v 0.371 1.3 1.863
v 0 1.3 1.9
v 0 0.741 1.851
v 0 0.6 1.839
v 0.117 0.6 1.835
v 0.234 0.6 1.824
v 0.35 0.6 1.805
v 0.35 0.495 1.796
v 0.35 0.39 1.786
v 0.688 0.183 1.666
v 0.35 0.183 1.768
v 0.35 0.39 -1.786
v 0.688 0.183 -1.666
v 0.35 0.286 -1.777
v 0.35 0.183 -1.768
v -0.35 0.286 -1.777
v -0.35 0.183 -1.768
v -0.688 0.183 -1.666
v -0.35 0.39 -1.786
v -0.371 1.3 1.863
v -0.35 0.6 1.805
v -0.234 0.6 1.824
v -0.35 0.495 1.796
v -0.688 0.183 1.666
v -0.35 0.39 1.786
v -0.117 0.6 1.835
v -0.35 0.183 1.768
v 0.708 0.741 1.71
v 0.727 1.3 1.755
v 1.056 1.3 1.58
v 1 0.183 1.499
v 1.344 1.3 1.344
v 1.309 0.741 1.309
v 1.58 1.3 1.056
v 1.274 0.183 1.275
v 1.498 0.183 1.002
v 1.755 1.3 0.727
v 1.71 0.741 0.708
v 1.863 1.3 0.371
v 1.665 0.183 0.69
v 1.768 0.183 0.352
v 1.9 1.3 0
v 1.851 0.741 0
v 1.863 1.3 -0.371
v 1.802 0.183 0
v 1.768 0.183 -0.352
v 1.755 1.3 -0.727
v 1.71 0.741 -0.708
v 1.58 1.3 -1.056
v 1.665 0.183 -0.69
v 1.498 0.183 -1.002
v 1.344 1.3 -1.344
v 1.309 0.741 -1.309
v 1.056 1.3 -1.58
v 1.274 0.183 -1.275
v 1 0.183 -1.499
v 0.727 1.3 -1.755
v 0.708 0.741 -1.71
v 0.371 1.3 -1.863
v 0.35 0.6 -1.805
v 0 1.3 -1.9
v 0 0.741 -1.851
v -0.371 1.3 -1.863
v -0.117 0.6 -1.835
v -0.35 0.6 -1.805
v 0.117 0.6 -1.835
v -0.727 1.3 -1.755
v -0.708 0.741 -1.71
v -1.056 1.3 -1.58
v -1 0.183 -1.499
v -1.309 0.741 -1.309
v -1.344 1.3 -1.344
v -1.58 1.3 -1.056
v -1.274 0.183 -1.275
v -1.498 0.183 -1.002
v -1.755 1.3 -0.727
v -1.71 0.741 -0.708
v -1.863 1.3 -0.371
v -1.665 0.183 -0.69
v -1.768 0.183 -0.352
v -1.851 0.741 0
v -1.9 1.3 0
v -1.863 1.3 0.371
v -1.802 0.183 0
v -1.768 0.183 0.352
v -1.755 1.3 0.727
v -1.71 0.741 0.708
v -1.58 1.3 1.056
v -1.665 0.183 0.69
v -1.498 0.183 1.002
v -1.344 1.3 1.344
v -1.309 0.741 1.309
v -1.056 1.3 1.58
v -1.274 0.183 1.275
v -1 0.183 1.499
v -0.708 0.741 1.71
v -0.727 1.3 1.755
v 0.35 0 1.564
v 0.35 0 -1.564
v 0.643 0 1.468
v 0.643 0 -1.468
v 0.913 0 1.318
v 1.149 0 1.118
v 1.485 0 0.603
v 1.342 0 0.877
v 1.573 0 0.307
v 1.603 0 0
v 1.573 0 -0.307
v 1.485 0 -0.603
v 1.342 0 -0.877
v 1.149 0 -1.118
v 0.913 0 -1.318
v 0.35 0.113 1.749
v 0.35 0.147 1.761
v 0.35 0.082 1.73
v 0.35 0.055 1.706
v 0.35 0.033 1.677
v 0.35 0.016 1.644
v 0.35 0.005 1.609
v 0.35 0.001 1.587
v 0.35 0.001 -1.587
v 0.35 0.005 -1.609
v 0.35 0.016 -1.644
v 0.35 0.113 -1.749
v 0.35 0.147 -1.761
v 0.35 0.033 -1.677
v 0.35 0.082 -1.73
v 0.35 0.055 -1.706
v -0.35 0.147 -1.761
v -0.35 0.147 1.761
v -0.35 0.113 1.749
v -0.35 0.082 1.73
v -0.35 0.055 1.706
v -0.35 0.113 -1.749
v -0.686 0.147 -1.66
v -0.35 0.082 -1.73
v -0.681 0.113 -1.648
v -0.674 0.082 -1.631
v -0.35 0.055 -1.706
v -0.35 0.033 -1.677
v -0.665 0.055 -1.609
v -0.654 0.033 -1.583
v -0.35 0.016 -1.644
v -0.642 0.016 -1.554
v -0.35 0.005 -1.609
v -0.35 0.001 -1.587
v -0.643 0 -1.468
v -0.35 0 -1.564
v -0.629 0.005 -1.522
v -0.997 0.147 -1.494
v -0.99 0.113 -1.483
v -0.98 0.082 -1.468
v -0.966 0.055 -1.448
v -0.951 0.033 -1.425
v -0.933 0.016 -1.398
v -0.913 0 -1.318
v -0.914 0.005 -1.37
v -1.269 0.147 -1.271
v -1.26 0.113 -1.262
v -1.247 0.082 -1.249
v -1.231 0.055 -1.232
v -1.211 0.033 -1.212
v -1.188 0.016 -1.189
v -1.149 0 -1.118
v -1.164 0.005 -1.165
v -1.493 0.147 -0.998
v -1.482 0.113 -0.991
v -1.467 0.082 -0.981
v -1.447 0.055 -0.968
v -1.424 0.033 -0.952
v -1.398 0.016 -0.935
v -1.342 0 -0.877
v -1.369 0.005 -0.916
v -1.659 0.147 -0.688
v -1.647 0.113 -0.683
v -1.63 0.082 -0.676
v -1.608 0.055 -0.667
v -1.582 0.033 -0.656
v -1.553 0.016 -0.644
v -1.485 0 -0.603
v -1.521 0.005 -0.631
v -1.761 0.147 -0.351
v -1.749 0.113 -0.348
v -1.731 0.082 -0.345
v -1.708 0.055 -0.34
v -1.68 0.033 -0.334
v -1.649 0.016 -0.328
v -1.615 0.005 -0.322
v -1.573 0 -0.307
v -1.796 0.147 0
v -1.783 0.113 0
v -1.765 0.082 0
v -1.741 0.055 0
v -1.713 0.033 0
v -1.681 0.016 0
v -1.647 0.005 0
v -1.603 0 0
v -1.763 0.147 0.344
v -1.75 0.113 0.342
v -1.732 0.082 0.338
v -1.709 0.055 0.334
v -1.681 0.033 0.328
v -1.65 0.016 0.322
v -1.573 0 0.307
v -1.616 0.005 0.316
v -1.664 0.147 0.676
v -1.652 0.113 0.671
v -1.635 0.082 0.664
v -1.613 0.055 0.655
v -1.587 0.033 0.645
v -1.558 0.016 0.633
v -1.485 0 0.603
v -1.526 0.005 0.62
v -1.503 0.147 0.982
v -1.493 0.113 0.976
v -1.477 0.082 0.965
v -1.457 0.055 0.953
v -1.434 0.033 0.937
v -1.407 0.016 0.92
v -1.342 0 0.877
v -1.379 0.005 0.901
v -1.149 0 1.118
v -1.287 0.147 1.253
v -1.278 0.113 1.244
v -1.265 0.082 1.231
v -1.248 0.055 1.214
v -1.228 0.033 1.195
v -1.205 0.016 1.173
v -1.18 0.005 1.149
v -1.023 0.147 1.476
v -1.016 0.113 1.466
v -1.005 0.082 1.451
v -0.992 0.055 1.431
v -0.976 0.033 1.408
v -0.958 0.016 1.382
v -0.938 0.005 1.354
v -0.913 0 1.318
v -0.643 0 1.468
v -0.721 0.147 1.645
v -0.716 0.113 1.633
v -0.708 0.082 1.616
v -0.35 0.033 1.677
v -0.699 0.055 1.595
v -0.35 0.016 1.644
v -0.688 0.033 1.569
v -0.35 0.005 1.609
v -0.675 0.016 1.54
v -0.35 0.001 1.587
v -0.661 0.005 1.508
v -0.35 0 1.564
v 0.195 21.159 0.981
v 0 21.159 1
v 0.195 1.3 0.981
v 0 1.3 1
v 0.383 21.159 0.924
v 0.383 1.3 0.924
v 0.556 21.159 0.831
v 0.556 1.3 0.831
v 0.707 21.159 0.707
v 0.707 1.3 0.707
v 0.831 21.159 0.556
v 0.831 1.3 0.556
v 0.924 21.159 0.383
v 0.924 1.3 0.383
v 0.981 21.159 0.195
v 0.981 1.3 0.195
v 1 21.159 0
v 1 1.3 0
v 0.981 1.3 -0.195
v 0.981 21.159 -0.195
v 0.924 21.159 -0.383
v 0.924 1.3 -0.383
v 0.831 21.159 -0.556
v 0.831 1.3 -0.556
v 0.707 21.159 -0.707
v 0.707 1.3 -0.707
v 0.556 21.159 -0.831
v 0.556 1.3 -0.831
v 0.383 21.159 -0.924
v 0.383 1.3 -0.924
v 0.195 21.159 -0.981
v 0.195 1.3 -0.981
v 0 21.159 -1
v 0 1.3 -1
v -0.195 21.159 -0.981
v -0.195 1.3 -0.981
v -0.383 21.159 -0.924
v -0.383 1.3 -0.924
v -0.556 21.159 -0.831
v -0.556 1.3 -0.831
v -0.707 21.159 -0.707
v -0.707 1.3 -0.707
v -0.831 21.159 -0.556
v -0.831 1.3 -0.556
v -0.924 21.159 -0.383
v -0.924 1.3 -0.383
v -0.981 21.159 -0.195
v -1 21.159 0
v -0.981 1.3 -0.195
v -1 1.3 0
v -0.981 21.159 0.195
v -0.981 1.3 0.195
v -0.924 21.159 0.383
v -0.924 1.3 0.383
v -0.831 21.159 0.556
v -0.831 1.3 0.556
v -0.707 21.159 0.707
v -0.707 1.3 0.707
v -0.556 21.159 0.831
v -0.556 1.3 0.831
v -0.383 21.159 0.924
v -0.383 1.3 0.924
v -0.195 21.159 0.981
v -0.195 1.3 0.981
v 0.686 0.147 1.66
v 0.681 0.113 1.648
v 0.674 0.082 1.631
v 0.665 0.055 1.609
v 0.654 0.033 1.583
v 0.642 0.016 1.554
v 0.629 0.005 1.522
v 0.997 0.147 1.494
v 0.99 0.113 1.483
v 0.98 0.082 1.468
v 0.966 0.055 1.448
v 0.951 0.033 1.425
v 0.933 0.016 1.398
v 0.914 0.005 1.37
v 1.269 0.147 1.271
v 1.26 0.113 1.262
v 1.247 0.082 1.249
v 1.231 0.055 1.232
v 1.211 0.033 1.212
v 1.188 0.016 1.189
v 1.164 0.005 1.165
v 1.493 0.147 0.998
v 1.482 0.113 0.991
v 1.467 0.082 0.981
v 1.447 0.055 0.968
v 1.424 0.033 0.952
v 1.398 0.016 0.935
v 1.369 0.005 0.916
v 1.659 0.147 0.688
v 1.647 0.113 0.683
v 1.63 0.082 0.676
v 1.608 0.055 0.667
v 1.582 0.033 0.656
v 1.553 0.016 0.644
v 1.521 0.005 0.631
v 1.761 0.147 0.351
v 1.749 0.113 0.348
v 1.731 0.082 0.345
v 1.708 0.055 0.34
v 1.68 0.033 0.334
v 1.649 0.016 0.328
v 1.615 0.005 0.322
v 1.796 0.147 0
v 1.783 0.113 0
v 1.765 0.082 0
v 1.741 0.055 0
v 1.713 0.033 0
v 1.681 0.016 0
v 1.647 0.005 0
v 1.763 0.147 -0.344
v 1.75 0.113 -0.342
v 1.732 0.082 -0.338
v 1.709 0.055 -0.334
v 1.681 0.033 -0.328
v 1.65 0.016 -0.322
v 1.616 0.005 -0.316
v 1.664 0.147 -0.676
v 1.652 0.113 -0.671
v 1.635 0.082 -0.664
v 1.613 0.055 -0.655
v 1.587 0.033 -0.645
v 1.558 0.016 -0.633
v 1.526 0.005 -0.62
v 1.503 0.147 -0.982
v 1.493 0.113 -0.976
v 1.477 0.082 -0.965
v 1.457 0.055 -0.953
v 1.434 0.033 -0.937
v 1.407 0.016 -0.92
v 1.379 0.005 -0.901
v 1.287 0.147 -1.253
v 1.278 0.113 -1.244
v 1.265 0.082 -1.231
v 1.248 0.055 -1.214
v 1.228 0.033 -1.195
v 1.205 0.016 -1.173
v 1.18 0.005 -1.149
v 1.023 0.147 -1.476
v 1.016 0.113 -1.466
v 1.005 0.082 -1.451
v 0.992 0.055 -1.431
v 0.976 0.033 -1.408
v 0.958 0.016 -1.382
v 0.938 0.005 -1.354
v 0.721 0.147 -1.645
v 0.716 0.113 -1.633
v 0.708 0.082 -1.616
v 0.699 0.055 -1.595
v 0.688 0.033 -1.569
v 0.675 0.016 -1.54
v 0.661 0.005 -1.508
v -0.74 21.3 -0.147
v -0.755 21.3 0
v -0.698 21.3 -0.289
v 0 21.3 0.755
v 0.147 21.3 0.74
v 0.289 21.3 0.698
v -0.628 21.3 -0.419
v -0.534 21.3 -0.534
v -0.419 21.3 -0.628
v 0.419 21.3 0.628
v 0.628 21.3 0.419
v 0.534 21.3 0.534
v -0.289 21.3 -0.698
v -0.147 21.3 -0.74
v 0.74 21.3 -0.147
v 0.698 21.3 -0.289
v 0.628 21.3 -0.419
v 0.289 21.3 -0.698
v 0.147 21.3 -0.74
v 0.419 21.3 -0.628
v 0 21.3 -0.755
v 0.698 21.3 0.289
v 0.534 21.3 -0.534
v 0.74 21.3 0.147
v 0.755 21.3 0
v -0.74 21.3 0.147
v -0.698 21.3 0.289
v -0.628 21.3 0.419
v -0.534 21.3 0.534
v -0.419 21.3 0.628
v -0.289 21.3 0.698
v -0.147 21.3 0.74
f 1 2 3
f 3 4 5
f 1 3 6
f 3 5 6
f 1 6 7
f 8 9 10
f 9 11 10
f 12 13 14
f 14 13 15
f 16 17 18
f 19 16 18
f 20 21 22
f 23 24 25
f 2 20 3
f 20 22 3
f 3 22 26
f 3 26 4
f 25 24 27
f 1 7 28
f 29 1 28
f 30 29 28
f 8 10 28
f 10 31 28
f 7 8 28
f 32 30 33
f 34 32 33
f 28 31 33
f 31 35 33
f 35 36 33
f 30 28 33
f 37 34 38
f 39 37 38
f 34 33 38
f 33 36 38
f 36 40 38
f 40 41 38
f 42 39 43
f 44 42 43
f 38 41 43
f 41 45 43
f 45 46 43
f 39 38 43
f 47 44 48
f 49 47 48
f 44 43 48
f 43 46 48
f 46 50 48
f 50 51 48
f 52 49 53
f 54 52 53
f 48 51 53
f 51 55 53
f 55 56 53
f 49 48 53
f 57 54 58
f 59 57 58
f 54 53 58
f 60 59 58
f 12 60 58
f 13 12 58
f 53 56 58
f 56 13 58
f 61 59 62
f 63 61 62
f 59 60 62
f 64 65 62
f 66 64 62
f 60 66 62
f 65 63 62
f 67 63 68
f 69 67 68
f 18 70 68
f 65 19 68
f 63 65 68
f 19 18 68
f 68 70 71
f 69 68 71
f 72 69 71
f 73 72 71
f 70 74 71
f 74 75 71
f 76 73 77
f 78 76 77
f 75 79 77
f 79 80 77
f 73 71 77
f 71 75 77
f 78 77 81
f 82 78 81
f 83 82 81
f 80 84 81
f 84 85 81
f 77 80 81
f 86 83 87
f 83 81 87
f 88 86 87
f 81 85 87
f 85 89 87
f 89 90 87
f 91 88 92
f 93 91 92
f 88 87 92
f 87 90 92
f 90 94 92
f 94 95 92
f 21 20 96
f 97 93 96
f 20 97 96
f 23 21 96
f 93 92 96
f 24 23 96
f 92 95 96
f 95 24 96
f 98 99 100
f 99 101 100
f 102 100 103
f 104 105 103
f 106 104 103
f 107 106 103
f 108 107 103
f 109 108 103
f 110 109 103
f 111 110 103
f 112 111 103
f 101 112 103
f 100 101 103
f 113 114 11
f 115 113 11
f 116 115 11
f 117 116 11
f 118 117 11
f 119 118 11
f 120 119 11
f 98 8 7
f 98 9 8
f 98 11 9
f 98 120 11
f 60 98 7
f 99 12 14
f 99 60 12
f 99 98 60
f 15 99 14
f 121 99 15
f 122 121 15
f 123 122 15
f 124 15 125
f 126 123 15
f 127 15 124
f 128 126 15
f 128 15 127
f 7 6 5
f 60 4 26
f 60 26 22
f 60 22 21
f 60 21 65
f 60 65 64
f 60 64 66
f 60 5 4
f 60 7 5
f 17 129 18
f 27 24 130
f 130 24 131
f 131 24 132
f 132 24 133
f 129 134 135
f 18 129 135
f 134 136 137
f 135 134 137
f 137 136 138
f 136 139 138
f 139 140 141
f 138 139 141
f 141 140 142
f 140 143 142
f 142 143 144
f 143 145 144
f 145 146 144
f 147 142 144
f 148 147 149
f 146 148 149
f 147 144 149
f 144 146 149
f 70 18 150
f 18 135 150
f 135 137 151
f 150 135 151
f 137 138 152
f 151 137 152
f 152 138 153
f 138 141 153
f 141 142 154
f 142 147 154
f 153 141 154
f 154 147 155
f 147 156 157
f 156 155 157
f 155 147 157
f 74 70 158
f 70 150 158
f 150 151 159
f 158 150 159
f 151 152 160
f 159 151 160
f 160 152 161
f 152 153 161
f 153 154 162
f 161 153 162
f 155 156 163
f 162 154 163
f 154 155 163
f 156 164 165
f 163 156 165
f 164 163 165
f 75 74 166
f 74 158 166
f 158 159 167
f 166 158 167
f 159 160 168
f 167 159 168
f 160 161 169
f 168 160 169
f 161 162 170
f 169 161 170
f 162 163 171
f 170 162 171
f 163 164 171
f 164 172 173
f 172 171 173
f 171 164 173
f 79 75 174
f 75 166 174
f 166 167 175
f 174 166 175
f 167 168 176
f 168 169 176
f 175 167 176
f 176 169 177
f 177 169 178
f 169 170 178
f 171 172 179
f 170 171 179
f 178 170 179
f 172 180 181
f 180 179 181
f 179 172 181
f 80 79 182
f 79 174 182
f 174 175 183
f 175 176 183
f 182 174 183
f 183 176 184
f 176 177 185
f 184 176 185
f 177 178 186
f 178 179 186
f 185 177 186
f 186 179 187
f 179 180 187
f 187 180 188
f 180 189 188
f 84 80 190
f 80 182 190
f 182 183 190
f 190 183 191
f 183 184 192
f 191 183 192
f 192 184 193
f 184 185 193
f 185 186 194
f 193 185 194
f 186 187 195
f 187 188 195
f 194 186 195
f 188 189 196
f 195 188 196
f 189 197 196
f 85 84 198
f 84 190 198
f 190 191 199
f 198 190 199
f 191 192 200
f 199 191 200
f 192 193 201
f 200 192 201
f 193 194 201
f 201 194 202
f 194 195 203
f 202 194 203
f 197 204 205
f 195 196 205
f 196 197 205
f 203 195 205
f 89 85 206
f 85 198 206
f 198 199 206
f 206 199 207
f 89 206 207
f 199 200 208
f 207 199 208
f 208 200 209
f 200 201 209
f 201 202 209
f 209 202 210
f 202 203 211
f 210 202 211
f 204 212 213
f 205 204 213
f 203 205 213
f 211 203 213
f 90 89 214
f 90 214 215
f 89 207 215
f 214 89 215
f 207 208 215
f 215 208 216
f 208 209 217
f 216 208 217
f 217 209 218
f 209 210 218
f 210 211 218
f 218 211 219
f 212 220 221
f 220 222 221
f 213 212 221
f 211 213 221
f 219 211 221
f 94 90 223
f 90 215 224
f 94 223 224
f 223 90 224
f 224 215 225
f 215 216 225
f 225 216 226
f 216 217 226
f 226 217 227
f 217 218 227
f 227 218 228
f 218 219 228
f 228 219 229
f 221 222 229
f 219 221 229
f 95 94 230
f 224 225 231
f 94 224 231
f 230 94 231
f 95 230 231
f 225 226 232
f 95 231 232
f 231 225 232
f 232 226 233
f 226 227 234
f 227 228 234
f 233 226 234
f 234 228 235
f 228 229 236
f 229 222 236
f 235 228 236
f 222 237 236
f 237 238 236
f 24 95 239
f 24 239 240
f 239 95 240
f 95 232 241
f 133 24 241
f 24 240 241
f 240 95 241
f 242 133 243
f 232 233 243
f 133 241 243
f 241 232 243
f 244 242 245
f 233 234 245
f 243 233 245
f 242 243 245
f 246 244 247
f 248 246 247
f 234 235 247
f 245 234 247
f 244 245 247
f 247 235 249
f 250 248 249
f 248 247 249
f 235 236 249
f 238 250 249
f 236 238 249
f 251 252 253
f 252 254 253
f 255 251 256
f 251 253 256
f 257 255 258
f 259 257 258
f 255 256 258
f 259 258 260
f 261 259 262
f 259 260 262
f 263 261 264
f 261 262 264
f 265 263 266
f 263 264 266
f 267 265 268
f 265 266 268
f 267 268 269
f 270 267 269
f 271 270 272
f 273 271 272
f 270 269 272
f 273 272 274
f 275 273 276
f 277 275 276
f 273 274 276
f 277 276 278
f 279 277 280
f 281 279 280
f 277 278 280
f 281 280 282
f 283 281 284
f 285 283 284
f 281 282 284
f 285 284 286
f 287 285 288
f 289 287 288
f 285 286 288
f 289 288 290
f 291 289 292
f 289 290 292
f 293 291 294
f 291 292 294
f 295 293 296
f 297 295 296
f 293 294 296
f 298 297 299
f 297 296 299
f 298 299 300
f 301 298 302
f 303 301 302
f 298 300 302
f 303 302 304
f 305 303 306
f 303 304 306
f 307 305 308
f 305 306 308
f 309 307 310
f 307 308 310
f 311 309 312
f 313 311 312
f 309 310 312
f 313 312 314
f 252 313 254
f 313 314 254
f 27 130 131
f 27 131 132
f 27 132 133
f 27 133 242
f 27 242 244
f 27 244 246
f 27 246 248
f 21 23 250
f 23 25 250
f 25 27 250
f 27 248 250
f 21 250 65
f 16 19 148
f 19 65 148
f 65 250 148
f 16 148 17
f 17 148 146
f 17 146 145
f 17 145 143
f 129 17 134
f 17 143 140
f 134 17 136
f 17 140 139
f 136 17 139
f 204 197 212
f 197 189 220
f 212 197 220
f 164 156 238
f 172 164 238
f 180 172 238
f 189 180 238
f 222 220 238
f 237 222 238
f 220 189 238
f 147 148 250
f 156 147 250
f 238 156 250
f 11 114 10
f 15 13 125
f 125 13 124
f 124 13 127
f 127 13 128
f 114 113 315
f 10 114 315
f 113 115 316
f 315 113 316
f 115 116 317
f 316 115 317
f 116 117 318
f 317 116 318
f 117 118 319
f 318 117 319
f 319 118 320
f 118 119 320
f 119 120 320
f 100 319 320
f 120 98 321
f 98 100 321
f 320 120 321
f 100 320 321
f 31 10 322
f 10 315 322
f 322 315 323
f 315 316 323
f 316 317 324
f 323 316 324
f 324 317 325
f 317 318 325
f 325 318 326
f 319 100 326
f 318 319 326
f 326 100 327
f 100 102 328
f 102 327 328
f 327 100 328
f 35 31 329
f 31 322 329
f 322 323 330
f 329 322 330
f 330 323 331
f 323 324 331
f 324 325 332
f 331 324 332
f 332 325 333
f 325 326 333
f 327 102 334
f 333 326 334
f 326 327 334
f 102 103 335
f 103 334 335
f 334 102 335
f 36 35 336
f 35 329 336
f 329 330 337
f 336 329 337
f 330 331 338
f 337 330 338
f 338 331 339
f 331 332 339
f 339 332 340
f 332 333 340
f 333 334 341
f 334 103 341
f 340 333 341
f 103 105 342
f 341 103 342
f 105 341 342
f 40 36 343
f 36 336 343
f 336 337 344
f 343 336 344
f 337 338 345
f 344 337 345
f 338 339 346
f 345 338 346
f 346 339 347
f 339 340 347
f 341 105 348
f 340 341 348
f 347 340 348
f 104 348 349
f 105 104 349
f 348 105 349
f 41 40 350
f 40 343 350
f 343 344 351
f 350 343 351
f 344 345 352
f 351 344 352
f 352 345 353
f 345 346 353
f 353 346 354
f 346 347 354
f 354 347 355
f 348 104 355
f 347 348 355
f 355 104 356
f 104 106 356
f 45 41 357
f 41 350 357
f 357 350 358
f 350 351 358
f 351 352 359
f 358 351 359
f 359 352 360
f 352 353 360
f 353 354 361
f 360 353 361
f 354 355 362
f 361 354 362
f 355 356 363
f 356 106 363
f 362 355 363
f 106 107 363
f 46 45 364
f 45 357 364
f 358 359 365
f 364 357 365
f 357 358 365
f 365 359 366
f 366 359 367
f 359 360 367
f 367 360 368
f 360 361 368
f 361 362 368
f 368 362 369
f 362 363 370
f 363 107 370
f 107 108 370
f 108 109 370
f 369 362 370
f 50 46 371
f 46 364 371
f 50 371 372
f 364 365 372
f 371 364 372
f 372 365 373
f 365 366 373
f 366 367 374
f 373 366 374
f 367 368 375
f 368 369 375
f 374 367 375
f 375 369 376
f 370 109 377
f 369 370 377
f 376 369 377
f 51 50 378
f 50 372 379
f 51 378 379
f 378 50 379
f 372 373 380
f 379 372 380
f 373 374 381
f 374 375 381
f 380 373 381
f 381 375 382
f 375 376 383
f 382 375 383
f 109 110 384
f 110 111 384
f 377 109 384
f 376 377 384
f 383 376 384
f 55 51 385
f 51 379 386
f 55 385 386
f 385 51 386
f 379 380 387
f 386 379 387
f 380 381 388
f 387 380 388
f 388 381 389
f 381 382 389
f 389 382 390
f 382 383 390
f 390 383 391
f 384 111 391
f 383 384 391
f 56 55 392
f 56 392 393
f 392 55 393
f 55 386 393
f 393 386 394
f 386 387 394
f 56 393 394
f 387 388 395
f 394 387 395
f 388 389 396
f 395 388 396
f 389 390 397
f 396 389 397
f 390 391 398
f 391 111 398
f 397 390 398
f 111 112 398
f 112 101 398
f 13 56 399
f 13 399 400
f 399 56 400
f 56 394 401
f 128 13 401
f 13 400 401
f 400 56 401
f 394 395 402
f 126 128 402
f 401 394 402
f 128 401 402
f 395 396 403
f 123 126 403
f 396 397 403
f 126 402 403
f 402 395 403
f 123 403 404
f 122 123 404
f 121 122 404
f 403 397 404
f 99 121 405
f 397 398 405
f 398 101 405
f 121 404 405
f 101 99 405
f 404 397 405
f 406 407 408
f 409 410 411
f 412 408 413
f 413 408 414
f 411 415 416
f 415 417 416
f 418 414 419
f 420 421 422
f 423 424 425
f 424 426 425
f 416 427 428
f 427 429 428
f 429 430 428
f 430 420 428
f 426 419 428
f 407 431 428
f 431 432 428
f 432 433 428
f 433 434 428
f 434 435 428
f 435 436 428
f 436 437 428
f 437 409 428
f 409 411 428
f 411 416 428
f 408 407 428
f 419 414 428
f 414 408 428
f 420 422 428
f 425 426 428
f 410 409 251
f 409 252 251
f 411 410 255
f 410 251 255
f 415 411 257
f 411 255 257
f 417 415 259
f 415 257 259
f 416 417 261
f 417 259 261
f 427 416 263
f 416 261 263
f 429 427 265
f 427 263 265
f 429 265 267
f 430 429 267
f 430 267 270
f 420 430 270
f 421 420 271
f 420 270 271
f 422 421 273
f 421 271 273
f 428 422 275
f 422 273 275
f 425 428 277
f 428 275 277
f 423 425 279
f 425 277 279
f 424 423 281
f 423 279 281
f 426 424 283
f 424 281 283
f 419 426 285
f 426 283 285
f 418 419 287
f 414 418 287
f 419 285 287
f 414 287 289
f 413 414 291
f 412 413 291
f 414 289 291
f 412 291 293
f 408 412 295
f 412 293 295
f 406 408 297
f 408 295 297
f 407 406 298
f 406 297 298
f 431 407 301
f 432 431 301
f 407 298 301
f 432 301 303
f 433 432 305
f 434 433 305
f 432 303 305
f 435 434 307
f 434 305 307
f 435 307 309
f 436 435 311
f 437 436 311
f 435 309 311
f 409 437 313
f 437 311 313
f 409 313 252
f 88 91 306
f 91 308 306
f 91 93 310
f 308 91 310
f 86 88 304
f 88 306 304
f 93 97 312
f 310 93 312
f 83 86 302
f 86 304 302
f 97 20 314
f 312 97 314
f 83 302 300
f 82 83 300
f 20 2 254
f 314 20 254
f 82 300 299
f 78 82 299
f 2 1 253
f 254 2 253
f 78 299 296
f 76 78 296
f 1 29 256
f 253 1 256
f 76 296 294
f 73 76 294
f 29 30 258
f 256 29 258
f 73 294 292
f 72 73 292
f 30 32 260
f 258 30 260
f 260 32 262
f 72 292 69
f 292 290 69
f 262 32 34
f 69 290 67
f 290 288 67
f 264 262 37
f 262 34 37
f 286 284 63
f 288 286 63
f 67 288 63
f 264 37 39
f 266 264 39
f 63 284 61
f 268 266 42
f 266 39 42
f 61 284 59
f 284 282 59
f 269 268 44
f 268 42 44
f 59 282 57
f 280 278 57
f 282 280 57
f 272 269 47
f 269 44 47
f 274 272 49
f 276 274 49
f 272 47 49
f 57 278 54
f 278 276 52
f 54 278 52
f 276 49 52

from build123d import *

# Parameters (mm, degrees)
SKETCH001_W  = 3.8
SKETCH001_H  = 0.7
POCKET_DEPTH = 0.6


with BuildPart() as part:
    # Sketch → Revolution (revolve)
    with BuildSketch(Plane.YZ):
        with BuildLine():
            Line((0, 1.603002), (0, 0))
            Line((0, 0), (21.3, 0))
            Line((21.3, 0), (21.3, 0.755))
            Line((21.3, 0.755), (21.158549, 1))
            Line((21.158549, 1), (1.3, 1))
            Line((1.3, 1), (1.3, 1.9))
            Line((1.3, 1.9), (0.182569, 1.802237))
            ThreePointArc((0.182569, 1.802237), (0.052546, 1.738118), (0, 1.603002))
        make_face()
    revolve(axis=Axis((0, 0, 0), (0, 1, 0)))

    # Sketch001 → Pocket (cut)
    with BuildSketch(Plane(origin=(0, 0, 0), x_dir=(0, 0, -1), z_dir=(0, -1, 0))):
        Rectangle(SKETCH001_W, SKETCH001_H)
    extrude(amount=-POCKET_DEPTH, mode=Mode.SUBTRACT)


solid = part.part
